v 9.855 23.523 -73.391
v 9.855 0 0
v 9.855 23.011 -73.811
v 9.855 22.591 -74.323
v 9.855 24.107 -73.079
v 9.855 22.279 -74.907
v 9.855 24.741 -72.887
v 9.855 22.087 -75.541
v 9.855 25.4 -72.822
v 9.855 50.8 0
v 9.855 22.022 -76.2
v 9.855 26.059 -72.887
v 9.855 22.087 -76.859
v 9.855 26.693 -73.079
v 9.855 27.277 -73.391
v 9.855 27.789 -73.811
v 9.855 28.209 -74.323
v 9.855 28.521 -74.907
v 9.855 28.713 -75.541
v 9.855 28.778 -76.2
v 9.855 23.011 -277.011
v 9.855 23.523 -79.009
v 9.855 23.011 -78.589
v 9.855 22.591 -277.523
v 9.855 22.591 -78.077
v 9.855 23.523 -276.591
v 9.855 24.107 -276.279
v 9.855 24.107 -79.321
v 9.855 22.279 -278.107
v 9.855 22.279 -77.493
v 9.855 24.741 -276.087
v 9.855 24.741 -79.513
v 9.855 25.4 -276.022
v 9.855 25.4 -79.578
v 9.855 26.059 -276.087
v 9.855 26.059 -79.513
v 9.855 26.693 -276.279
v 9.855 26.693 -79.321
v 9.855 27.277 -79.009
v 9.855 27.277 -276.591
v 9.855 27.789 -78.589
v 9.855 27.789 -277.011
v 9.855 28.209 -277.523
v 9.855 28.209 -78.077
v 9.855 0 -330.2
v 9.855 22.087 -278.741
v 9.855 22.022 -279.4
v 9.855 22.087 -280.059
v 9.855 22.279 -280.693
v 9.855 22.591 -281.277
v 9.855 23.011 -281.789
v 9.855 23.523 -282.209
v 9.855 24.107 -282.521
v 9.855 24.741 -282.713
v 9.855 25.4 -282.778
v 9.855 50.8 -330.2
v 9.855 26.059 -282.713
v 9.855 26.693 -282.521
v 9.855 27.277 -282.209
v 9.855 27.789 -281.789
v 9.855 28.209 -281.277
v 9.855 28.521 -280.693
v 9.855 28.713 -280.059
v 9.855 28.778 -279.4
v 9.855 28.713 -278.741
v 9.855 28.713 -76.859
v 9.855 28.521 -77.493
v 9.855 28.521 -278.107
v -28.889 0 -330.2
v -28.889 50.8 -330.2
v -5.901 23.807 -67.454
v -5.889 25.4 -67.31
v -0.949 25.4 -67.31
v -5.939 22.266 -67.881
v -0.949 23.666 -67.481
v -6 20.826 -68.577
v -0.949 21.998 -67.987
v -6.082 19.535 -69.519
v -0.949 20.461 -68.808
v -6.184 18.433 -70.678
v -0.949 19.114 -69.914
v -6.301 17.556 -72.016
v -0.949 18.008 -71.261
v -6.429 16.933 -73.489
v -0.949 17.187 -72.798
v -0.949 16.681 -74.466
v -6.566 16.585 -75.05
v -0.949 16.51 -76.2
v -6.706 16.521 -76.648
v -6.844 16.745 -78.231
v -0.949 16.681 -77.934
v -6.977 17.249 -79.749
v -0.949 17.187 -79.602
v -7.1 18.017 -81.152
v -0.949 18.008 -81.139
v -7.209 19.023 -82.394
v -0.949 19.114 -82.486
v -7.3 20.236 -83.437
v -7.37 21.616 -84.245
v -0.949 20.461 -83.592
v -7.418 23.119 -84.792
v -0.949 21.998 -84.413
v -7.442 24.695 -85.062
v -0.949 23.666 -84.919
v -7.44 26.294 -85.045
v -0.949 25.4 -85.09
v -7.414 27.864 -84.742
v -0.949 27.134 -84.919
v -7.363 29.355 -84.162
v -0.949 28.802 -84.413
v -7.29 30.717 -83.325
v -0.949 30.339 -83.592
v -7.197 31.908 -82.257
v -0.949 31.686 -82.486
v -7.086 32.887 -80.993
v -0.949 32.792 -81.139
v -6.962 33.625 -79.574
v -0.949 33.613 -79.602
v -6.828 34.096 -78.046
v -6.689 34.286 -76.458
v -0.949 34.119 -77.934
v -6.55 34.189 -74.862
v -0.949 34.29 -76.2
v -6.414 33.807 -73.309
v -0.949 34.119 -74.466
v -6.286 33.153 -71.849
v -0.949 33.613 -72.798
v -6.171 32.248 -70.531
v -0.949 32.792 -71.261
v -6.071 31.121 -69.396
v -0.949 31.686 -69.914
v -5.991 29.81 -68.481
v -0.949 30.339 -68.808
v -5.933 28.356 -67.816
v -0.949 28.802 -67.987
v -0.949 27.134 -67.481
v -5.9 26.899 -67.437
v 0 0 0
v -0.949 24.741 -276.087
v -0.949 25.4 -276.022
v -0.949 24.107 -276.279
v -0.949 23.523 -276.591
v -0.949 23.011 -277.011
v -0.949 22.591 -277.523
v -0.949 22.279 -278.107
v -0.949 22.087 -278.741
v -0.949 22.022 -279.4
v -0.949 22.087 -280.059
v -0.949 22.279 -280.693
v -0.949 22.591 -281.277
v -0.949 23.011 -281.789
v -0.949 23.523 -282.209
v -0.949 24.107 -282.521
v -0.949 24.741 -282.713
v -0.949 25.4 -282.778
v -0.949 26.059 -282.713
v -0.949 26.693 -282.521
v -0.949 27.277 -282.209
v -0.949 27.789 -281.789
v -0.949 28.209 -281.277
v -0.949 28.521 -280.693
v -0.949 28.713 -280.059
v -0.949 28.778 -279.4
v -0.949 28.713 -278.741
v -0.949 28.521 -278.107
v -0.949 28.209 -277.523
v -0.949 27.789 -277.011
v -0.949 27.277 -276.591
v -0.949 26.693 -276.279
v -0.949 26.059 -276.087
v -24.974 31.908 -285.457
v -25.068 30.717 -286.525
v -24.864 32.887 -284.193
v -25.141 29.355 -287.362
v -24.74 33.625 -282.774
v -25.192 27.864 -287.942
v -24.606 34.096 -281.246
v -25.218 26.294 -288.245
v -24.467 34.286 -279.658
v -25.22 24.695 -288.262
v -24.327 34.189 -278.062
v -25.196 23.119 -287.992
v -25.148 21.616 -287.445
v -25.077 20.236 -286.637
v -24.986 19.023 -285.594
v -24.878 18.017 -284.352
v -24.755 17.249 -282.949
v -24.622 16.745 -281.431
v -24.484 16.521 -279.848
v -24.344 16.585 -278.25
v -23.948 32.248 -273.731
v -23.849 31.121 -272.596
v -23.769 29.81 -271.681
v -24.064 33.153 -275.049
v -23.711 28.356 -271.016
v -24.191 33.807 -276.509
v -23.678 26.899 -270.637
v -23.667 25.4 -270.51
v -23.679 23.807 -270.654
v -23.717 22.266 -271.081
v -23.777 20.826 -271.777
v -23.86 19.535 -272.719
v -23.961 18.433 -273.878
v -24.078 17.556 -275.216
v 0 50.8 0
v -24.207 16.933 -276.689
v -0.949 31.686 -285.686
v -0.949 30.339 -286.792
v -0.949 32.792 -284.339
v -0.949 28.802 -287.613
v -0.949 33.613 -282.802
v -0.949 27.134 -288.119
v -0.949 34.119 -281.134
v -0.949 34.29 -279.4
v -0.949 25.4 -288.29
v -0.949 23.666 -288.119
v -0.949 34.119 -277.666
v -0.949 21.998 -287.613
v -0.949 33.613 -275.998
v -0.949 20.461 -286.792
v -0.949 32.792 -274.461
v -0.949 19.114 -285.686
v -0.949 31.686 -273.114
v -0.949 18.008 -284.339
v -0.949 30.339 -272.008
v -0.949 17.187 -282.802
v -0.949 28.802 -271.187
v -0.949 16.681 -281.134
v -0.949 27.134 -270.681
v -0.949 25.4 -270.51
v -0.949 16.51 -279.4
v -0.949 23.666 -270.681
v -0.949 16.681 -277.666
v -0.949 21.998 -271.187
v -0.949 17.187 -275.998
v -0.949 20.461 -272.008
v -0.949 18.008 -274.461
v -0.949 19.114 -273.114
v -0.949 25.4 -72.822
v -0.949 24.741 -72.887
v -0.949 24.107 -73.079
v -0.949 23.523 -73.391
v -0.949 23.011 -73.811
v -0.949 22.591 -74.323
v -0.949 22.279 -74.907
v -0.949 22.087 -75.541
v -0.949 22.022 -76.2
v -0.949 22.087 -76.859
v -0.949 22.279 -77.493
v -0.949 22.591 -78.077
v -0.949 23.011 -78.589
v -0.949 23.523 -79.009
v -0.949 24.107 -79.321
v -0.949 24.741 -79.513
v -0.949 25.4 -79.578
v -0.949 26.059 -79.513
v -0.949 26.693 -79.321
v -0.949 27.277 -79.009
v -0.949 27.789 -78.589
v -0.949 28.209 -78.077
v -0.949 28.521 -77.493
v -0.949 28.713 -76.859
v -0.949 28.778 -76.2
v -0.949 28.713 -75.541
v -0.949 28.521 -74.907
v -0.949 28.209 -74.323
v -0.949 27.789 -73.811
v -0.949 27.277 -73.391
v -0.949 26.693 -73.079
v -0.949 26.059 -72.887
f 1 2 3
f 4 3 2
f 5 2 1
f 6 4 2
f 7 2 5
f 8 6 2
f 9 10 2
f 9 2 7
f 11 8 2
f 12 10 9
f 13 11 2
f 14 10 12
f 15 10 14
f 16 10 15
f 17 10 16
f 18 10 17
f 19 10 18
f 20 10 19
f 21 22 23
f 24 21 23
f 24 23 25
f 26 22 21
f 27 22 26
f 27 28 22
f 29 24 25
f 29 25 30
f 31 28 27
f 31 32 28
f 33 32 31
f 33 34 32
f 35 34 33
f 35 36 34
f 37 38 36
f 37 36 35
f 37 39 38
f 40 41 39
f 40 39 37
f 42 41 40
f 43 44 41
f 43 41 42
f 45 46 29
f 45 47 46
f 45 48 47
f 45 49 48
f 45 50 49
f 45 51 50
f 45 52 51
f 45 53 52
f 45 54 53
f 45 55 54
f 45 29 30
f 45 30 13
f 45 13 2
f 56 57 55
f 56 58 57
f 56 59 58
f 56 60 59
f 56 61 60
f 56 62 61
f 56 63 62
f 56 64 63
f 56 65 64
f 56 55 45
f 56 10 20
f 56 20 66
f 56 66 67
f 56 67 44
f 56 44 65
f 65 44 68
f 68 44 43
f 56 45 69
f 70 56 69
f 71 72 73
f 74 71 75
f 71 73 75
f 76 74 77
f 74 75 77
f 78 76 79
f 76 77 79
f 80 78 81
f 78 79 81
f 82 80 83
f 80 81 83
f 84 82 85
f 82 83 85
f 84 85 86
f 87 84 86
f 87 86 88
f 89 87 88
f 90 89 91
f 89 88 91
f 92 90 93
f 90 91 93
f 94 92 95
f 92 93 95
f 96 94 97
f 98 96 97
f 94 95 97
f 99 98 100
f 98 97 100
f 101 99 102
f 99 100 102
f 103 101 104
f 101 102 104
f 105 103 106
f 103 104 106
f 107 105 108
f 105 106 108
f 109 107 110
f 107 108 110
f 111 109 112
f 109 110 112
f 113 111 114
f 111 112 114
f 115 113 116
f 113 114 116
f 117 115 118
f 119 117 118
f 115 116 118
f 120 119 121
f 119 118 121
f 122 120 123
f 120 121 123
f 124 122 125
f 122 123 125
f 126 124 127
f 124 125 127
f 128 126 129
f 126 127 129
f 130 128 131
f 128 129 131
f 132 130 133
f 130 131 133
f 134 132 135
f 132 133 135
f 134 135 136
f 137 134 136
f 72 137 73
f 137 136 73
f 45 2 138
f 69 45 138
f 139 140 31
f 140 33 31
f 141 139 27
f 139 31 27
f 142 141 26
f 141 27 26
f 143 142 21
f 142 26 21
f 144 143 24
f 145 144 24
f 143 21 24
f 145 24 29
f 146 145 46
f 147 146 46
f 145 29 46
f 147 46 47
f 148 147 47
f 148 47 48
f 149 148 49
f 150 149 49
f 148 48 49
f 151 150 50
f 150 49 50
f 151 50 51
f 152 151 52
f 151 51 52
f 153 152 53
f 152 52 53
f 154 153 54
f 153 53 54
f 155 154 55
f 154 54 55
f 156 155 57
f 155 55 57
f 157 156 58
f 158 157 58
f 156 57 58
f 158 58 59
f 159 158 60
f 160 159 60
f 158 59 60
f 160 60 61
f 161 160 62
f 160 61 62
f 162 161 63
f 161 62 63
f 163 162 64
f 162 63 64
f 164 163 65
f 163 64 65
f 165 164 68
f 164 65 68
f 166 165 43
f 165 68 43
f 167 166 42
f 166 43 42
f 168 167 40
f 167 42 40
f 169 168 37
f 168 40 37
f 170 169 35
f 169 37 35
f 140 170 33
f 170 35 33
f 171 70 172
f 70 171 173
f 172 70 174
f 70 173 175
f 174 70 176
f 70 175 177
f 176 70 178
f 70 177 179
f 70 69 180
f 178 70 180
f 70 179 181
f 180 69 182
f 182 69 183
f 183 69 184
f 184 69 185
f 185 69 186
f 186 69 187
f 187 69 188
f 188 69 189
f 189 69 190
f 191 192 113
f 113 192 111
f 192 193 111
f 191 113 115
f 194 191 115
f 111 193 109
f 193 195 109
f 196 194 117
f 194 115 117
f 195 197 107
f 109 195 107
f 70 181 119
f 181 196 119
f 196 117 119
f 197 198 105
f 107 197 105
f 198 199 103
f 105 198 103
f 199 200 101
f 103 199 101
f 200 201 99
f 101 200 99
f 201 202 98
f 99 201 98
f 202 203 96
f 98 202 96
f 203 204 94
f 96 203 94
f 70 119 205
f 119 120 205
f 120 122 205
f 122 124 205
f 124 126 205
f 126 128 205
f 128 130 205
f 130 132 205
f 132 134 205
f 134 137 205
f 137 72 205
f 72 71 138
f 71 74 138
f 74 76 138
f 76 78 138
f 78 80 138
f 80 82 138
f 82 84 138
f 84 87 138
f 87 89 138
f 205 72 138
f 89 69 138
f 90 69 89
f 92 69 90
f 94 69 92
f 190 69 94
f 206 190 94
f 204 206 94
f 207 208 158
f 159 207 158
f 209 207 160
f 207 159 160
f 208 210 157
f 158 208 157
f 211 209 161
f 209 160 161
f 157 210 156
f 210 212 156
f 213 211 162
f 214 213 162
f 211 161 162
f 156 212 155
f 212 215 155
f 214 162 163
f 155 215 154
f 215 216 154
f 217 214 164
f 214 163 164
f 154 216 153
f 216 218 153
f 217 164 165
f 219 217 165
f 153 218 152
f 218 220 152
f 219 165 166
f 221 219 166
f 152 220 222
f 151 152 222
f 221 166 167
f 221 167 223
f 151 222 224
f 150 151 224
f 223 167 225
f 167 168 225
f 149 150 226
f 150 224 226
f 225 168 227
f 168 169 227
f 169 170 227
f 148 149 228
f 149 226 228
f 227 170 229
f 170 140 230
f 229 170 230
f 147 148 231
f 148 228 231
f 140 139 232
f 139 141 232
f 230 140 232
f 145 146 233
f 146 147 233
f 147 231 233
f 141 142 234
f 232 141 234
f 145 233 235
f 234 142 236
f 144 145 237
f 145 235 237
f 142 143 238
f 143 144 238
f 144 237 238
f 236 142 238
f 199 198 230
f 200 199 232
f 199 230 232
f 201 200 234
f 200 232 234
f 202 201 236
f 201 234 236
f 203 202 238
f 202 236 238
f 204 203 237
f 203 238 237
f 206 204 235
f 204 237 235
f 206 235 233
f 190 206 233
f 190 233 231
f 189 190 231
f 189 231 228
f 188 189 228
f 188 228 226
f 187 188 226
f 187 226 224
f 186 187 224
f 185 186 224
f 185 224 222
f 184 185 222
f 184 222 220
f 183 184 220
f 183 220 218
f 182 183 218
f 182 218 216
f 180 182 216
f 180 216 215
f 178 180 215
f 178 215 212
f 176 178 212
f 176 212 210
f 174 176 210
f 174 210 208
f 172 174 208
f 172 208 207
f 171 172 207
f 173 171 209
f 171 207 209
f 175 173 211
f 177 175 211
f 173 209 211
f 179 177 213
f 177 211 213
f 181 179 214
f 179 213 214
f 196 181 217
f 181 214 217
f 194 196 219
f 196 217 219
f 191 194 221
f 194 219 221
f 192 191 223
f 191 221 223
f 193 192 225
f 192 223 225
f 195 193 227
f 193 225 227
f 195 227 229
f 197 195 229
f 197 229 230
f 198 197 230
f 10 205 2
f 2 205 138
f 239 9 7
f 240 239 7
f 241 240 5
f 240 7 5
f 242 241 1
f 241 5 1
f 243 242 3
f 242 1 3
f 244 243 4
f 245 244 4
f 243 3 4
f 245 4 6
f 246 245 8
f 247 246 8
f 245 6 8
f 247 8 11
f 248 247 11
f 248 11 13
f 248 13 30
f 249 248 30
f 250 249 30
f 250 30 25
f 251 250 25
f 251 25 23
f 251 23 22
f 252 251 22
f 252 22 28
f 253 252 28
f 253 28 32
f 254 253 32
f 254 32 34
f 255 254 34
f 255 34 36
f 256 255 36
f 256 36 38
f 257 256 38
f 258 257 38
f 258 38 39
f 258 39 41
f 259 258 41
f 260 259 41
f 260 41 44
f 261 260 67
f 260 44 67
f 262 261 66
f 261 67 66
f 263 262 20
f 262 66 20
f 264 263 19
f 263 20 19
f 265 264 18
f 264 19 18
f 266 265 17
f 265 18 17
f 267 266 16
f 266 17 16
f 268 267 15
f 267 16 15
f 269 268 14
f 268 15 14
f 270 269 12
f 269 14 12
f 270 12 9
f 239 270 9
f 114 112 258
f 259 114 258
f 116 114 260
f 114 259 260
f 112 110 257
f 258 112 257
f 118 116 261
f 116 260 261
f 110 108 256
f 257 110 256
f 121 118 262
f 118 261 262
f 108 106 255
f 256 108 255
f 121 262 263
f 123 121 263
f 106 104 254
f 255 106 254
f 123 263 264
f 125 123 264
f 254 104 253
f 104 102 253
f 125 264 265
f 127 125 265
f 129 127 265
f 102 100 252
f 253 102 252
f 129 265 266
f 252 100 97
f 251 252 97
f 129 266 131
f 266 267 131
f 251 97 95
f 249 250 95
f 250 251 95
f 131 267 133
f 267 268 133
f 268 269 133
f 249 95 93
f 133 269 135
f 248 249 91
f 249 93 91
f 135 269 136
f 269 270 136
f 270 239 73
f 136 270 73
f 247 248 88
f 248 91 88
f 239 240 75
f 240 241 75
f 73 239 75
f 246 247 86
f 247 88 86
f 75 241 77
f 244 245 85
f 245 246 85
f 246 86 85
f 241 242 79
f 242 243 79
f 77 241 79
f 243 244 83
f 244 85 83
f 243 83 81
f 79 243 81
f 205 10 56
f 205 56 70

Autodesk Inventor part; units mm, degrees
ref_plane "YZ Plane" through (0, 0, 0) normal (1, 0, 0) x (0, 1, 0)
ref_plane "XZ Plane" through (0, 0, 0) normal (0, 1, 0) x (-1, 0, 0)
sketch "Sketch1" plane through (0, 0, 0) normal (0, 1, 0) x (-1, 0, 0)
  line L0 (0, 0) -> (0, -330.2)
  line L1 (0, -330.2) -> (0, -122.0086)
  line L2 (0, -330.2) -> (28.8888, -330.2)
  line L3 (28.8888, -330.2) -> (0, 0)
  dimension "d0" = 330.2
  dimension "d1" = 5
extrude "Extrusion1" add sketch "Sketch1" along normal blind 50.8
ref_plane "Work Plane1" through (-28.8888, 50.8, -330.2) normal (1, 0, 0) x (0, 0, -1)
sketch "Sketch2" plane through (0, 0, 0) normal (1, 0, 0) x (0, 0, -1)
  line L0 (0, 0) -> (330.2, 0) projected
  line L1 (0, 50.8) -> (330.2, 50.8) projected
  line L2 (0, 0) -> (330.2, 0)
  line L3 (330.2, 0) -> (330.2, 50.8)
  line L4 (330.2, 50.8) -> (0, 50.8)
  line L5 (0, 50.8) -> (0, 0)
extrude "Extrusion2" add sketch "Sketch2" along normal blind 9.8552
sketch "Sketch4" plane through (-28.8888, 50.8, -330.2) normal (1, 0, 0) x (0, 0, -1)
  line L0 (0, -50.8) -> (0, 0) construction
  line L1 (0, -25.4) -> (-279.4, -25.4) construction
  line L2 (0, -50.8) -> (-330.2, -50.8) construction
  line L3 (-330.2, -50.8) -> (-330.2, 0) construction
  point P0 (-254, -25.4)
  point P1 (-50.8, -25.4)
  point P2 (-330.2, 0)
  dimension "d16" = 25.4
  dimension "d17" = 76.2
  dimension "d18" = 279.4
hole "Hole2" at (-28.8888, 25.4, -76.2) at (-28.8888, 25.4, -279.4) direction (1, 0, 0) diameter 6.7564 end through all counterbore diameter 17.78 counterbore depth 27.94 clearance for "Socket Head Cap Screw" size "1/4" standard "Ansi Unified Screw Threads"
equation "\"d0\" = lengthOfFixture"
equation "\"d1\" = cutAngle"
equation "\"d2\" = heightOfJig"
equation "\"d4\" = addedDepthToSupportBolts"
equation "\"d16\" = heightOfBoltHolt"
equation "\"d17\" = bottomToFirstHole"
equation "\"d18\" = bottomToSecondHole"
equation "\"lengthOfFixture\" = 330.2"
equation "\"cutAngle\" = 5deg"
equation "\"bottomToFirstHole\" = 76.2"
equation "\"distanceBetweenBolts\" = 203.2"
equation "\"bottomToSecondHole\" = bottomToFirstHole + distanceBetweenBolts"
equation "\"heightOfBoltHolt\" = 25.4"
equation "\"boltSize\" = 6.35"
equation "\"heightOfJig\" = 50.8"
equation "\"addedDepthToSupportBolts\" = 9.8552"
properties part number "jigForRipCuts"
